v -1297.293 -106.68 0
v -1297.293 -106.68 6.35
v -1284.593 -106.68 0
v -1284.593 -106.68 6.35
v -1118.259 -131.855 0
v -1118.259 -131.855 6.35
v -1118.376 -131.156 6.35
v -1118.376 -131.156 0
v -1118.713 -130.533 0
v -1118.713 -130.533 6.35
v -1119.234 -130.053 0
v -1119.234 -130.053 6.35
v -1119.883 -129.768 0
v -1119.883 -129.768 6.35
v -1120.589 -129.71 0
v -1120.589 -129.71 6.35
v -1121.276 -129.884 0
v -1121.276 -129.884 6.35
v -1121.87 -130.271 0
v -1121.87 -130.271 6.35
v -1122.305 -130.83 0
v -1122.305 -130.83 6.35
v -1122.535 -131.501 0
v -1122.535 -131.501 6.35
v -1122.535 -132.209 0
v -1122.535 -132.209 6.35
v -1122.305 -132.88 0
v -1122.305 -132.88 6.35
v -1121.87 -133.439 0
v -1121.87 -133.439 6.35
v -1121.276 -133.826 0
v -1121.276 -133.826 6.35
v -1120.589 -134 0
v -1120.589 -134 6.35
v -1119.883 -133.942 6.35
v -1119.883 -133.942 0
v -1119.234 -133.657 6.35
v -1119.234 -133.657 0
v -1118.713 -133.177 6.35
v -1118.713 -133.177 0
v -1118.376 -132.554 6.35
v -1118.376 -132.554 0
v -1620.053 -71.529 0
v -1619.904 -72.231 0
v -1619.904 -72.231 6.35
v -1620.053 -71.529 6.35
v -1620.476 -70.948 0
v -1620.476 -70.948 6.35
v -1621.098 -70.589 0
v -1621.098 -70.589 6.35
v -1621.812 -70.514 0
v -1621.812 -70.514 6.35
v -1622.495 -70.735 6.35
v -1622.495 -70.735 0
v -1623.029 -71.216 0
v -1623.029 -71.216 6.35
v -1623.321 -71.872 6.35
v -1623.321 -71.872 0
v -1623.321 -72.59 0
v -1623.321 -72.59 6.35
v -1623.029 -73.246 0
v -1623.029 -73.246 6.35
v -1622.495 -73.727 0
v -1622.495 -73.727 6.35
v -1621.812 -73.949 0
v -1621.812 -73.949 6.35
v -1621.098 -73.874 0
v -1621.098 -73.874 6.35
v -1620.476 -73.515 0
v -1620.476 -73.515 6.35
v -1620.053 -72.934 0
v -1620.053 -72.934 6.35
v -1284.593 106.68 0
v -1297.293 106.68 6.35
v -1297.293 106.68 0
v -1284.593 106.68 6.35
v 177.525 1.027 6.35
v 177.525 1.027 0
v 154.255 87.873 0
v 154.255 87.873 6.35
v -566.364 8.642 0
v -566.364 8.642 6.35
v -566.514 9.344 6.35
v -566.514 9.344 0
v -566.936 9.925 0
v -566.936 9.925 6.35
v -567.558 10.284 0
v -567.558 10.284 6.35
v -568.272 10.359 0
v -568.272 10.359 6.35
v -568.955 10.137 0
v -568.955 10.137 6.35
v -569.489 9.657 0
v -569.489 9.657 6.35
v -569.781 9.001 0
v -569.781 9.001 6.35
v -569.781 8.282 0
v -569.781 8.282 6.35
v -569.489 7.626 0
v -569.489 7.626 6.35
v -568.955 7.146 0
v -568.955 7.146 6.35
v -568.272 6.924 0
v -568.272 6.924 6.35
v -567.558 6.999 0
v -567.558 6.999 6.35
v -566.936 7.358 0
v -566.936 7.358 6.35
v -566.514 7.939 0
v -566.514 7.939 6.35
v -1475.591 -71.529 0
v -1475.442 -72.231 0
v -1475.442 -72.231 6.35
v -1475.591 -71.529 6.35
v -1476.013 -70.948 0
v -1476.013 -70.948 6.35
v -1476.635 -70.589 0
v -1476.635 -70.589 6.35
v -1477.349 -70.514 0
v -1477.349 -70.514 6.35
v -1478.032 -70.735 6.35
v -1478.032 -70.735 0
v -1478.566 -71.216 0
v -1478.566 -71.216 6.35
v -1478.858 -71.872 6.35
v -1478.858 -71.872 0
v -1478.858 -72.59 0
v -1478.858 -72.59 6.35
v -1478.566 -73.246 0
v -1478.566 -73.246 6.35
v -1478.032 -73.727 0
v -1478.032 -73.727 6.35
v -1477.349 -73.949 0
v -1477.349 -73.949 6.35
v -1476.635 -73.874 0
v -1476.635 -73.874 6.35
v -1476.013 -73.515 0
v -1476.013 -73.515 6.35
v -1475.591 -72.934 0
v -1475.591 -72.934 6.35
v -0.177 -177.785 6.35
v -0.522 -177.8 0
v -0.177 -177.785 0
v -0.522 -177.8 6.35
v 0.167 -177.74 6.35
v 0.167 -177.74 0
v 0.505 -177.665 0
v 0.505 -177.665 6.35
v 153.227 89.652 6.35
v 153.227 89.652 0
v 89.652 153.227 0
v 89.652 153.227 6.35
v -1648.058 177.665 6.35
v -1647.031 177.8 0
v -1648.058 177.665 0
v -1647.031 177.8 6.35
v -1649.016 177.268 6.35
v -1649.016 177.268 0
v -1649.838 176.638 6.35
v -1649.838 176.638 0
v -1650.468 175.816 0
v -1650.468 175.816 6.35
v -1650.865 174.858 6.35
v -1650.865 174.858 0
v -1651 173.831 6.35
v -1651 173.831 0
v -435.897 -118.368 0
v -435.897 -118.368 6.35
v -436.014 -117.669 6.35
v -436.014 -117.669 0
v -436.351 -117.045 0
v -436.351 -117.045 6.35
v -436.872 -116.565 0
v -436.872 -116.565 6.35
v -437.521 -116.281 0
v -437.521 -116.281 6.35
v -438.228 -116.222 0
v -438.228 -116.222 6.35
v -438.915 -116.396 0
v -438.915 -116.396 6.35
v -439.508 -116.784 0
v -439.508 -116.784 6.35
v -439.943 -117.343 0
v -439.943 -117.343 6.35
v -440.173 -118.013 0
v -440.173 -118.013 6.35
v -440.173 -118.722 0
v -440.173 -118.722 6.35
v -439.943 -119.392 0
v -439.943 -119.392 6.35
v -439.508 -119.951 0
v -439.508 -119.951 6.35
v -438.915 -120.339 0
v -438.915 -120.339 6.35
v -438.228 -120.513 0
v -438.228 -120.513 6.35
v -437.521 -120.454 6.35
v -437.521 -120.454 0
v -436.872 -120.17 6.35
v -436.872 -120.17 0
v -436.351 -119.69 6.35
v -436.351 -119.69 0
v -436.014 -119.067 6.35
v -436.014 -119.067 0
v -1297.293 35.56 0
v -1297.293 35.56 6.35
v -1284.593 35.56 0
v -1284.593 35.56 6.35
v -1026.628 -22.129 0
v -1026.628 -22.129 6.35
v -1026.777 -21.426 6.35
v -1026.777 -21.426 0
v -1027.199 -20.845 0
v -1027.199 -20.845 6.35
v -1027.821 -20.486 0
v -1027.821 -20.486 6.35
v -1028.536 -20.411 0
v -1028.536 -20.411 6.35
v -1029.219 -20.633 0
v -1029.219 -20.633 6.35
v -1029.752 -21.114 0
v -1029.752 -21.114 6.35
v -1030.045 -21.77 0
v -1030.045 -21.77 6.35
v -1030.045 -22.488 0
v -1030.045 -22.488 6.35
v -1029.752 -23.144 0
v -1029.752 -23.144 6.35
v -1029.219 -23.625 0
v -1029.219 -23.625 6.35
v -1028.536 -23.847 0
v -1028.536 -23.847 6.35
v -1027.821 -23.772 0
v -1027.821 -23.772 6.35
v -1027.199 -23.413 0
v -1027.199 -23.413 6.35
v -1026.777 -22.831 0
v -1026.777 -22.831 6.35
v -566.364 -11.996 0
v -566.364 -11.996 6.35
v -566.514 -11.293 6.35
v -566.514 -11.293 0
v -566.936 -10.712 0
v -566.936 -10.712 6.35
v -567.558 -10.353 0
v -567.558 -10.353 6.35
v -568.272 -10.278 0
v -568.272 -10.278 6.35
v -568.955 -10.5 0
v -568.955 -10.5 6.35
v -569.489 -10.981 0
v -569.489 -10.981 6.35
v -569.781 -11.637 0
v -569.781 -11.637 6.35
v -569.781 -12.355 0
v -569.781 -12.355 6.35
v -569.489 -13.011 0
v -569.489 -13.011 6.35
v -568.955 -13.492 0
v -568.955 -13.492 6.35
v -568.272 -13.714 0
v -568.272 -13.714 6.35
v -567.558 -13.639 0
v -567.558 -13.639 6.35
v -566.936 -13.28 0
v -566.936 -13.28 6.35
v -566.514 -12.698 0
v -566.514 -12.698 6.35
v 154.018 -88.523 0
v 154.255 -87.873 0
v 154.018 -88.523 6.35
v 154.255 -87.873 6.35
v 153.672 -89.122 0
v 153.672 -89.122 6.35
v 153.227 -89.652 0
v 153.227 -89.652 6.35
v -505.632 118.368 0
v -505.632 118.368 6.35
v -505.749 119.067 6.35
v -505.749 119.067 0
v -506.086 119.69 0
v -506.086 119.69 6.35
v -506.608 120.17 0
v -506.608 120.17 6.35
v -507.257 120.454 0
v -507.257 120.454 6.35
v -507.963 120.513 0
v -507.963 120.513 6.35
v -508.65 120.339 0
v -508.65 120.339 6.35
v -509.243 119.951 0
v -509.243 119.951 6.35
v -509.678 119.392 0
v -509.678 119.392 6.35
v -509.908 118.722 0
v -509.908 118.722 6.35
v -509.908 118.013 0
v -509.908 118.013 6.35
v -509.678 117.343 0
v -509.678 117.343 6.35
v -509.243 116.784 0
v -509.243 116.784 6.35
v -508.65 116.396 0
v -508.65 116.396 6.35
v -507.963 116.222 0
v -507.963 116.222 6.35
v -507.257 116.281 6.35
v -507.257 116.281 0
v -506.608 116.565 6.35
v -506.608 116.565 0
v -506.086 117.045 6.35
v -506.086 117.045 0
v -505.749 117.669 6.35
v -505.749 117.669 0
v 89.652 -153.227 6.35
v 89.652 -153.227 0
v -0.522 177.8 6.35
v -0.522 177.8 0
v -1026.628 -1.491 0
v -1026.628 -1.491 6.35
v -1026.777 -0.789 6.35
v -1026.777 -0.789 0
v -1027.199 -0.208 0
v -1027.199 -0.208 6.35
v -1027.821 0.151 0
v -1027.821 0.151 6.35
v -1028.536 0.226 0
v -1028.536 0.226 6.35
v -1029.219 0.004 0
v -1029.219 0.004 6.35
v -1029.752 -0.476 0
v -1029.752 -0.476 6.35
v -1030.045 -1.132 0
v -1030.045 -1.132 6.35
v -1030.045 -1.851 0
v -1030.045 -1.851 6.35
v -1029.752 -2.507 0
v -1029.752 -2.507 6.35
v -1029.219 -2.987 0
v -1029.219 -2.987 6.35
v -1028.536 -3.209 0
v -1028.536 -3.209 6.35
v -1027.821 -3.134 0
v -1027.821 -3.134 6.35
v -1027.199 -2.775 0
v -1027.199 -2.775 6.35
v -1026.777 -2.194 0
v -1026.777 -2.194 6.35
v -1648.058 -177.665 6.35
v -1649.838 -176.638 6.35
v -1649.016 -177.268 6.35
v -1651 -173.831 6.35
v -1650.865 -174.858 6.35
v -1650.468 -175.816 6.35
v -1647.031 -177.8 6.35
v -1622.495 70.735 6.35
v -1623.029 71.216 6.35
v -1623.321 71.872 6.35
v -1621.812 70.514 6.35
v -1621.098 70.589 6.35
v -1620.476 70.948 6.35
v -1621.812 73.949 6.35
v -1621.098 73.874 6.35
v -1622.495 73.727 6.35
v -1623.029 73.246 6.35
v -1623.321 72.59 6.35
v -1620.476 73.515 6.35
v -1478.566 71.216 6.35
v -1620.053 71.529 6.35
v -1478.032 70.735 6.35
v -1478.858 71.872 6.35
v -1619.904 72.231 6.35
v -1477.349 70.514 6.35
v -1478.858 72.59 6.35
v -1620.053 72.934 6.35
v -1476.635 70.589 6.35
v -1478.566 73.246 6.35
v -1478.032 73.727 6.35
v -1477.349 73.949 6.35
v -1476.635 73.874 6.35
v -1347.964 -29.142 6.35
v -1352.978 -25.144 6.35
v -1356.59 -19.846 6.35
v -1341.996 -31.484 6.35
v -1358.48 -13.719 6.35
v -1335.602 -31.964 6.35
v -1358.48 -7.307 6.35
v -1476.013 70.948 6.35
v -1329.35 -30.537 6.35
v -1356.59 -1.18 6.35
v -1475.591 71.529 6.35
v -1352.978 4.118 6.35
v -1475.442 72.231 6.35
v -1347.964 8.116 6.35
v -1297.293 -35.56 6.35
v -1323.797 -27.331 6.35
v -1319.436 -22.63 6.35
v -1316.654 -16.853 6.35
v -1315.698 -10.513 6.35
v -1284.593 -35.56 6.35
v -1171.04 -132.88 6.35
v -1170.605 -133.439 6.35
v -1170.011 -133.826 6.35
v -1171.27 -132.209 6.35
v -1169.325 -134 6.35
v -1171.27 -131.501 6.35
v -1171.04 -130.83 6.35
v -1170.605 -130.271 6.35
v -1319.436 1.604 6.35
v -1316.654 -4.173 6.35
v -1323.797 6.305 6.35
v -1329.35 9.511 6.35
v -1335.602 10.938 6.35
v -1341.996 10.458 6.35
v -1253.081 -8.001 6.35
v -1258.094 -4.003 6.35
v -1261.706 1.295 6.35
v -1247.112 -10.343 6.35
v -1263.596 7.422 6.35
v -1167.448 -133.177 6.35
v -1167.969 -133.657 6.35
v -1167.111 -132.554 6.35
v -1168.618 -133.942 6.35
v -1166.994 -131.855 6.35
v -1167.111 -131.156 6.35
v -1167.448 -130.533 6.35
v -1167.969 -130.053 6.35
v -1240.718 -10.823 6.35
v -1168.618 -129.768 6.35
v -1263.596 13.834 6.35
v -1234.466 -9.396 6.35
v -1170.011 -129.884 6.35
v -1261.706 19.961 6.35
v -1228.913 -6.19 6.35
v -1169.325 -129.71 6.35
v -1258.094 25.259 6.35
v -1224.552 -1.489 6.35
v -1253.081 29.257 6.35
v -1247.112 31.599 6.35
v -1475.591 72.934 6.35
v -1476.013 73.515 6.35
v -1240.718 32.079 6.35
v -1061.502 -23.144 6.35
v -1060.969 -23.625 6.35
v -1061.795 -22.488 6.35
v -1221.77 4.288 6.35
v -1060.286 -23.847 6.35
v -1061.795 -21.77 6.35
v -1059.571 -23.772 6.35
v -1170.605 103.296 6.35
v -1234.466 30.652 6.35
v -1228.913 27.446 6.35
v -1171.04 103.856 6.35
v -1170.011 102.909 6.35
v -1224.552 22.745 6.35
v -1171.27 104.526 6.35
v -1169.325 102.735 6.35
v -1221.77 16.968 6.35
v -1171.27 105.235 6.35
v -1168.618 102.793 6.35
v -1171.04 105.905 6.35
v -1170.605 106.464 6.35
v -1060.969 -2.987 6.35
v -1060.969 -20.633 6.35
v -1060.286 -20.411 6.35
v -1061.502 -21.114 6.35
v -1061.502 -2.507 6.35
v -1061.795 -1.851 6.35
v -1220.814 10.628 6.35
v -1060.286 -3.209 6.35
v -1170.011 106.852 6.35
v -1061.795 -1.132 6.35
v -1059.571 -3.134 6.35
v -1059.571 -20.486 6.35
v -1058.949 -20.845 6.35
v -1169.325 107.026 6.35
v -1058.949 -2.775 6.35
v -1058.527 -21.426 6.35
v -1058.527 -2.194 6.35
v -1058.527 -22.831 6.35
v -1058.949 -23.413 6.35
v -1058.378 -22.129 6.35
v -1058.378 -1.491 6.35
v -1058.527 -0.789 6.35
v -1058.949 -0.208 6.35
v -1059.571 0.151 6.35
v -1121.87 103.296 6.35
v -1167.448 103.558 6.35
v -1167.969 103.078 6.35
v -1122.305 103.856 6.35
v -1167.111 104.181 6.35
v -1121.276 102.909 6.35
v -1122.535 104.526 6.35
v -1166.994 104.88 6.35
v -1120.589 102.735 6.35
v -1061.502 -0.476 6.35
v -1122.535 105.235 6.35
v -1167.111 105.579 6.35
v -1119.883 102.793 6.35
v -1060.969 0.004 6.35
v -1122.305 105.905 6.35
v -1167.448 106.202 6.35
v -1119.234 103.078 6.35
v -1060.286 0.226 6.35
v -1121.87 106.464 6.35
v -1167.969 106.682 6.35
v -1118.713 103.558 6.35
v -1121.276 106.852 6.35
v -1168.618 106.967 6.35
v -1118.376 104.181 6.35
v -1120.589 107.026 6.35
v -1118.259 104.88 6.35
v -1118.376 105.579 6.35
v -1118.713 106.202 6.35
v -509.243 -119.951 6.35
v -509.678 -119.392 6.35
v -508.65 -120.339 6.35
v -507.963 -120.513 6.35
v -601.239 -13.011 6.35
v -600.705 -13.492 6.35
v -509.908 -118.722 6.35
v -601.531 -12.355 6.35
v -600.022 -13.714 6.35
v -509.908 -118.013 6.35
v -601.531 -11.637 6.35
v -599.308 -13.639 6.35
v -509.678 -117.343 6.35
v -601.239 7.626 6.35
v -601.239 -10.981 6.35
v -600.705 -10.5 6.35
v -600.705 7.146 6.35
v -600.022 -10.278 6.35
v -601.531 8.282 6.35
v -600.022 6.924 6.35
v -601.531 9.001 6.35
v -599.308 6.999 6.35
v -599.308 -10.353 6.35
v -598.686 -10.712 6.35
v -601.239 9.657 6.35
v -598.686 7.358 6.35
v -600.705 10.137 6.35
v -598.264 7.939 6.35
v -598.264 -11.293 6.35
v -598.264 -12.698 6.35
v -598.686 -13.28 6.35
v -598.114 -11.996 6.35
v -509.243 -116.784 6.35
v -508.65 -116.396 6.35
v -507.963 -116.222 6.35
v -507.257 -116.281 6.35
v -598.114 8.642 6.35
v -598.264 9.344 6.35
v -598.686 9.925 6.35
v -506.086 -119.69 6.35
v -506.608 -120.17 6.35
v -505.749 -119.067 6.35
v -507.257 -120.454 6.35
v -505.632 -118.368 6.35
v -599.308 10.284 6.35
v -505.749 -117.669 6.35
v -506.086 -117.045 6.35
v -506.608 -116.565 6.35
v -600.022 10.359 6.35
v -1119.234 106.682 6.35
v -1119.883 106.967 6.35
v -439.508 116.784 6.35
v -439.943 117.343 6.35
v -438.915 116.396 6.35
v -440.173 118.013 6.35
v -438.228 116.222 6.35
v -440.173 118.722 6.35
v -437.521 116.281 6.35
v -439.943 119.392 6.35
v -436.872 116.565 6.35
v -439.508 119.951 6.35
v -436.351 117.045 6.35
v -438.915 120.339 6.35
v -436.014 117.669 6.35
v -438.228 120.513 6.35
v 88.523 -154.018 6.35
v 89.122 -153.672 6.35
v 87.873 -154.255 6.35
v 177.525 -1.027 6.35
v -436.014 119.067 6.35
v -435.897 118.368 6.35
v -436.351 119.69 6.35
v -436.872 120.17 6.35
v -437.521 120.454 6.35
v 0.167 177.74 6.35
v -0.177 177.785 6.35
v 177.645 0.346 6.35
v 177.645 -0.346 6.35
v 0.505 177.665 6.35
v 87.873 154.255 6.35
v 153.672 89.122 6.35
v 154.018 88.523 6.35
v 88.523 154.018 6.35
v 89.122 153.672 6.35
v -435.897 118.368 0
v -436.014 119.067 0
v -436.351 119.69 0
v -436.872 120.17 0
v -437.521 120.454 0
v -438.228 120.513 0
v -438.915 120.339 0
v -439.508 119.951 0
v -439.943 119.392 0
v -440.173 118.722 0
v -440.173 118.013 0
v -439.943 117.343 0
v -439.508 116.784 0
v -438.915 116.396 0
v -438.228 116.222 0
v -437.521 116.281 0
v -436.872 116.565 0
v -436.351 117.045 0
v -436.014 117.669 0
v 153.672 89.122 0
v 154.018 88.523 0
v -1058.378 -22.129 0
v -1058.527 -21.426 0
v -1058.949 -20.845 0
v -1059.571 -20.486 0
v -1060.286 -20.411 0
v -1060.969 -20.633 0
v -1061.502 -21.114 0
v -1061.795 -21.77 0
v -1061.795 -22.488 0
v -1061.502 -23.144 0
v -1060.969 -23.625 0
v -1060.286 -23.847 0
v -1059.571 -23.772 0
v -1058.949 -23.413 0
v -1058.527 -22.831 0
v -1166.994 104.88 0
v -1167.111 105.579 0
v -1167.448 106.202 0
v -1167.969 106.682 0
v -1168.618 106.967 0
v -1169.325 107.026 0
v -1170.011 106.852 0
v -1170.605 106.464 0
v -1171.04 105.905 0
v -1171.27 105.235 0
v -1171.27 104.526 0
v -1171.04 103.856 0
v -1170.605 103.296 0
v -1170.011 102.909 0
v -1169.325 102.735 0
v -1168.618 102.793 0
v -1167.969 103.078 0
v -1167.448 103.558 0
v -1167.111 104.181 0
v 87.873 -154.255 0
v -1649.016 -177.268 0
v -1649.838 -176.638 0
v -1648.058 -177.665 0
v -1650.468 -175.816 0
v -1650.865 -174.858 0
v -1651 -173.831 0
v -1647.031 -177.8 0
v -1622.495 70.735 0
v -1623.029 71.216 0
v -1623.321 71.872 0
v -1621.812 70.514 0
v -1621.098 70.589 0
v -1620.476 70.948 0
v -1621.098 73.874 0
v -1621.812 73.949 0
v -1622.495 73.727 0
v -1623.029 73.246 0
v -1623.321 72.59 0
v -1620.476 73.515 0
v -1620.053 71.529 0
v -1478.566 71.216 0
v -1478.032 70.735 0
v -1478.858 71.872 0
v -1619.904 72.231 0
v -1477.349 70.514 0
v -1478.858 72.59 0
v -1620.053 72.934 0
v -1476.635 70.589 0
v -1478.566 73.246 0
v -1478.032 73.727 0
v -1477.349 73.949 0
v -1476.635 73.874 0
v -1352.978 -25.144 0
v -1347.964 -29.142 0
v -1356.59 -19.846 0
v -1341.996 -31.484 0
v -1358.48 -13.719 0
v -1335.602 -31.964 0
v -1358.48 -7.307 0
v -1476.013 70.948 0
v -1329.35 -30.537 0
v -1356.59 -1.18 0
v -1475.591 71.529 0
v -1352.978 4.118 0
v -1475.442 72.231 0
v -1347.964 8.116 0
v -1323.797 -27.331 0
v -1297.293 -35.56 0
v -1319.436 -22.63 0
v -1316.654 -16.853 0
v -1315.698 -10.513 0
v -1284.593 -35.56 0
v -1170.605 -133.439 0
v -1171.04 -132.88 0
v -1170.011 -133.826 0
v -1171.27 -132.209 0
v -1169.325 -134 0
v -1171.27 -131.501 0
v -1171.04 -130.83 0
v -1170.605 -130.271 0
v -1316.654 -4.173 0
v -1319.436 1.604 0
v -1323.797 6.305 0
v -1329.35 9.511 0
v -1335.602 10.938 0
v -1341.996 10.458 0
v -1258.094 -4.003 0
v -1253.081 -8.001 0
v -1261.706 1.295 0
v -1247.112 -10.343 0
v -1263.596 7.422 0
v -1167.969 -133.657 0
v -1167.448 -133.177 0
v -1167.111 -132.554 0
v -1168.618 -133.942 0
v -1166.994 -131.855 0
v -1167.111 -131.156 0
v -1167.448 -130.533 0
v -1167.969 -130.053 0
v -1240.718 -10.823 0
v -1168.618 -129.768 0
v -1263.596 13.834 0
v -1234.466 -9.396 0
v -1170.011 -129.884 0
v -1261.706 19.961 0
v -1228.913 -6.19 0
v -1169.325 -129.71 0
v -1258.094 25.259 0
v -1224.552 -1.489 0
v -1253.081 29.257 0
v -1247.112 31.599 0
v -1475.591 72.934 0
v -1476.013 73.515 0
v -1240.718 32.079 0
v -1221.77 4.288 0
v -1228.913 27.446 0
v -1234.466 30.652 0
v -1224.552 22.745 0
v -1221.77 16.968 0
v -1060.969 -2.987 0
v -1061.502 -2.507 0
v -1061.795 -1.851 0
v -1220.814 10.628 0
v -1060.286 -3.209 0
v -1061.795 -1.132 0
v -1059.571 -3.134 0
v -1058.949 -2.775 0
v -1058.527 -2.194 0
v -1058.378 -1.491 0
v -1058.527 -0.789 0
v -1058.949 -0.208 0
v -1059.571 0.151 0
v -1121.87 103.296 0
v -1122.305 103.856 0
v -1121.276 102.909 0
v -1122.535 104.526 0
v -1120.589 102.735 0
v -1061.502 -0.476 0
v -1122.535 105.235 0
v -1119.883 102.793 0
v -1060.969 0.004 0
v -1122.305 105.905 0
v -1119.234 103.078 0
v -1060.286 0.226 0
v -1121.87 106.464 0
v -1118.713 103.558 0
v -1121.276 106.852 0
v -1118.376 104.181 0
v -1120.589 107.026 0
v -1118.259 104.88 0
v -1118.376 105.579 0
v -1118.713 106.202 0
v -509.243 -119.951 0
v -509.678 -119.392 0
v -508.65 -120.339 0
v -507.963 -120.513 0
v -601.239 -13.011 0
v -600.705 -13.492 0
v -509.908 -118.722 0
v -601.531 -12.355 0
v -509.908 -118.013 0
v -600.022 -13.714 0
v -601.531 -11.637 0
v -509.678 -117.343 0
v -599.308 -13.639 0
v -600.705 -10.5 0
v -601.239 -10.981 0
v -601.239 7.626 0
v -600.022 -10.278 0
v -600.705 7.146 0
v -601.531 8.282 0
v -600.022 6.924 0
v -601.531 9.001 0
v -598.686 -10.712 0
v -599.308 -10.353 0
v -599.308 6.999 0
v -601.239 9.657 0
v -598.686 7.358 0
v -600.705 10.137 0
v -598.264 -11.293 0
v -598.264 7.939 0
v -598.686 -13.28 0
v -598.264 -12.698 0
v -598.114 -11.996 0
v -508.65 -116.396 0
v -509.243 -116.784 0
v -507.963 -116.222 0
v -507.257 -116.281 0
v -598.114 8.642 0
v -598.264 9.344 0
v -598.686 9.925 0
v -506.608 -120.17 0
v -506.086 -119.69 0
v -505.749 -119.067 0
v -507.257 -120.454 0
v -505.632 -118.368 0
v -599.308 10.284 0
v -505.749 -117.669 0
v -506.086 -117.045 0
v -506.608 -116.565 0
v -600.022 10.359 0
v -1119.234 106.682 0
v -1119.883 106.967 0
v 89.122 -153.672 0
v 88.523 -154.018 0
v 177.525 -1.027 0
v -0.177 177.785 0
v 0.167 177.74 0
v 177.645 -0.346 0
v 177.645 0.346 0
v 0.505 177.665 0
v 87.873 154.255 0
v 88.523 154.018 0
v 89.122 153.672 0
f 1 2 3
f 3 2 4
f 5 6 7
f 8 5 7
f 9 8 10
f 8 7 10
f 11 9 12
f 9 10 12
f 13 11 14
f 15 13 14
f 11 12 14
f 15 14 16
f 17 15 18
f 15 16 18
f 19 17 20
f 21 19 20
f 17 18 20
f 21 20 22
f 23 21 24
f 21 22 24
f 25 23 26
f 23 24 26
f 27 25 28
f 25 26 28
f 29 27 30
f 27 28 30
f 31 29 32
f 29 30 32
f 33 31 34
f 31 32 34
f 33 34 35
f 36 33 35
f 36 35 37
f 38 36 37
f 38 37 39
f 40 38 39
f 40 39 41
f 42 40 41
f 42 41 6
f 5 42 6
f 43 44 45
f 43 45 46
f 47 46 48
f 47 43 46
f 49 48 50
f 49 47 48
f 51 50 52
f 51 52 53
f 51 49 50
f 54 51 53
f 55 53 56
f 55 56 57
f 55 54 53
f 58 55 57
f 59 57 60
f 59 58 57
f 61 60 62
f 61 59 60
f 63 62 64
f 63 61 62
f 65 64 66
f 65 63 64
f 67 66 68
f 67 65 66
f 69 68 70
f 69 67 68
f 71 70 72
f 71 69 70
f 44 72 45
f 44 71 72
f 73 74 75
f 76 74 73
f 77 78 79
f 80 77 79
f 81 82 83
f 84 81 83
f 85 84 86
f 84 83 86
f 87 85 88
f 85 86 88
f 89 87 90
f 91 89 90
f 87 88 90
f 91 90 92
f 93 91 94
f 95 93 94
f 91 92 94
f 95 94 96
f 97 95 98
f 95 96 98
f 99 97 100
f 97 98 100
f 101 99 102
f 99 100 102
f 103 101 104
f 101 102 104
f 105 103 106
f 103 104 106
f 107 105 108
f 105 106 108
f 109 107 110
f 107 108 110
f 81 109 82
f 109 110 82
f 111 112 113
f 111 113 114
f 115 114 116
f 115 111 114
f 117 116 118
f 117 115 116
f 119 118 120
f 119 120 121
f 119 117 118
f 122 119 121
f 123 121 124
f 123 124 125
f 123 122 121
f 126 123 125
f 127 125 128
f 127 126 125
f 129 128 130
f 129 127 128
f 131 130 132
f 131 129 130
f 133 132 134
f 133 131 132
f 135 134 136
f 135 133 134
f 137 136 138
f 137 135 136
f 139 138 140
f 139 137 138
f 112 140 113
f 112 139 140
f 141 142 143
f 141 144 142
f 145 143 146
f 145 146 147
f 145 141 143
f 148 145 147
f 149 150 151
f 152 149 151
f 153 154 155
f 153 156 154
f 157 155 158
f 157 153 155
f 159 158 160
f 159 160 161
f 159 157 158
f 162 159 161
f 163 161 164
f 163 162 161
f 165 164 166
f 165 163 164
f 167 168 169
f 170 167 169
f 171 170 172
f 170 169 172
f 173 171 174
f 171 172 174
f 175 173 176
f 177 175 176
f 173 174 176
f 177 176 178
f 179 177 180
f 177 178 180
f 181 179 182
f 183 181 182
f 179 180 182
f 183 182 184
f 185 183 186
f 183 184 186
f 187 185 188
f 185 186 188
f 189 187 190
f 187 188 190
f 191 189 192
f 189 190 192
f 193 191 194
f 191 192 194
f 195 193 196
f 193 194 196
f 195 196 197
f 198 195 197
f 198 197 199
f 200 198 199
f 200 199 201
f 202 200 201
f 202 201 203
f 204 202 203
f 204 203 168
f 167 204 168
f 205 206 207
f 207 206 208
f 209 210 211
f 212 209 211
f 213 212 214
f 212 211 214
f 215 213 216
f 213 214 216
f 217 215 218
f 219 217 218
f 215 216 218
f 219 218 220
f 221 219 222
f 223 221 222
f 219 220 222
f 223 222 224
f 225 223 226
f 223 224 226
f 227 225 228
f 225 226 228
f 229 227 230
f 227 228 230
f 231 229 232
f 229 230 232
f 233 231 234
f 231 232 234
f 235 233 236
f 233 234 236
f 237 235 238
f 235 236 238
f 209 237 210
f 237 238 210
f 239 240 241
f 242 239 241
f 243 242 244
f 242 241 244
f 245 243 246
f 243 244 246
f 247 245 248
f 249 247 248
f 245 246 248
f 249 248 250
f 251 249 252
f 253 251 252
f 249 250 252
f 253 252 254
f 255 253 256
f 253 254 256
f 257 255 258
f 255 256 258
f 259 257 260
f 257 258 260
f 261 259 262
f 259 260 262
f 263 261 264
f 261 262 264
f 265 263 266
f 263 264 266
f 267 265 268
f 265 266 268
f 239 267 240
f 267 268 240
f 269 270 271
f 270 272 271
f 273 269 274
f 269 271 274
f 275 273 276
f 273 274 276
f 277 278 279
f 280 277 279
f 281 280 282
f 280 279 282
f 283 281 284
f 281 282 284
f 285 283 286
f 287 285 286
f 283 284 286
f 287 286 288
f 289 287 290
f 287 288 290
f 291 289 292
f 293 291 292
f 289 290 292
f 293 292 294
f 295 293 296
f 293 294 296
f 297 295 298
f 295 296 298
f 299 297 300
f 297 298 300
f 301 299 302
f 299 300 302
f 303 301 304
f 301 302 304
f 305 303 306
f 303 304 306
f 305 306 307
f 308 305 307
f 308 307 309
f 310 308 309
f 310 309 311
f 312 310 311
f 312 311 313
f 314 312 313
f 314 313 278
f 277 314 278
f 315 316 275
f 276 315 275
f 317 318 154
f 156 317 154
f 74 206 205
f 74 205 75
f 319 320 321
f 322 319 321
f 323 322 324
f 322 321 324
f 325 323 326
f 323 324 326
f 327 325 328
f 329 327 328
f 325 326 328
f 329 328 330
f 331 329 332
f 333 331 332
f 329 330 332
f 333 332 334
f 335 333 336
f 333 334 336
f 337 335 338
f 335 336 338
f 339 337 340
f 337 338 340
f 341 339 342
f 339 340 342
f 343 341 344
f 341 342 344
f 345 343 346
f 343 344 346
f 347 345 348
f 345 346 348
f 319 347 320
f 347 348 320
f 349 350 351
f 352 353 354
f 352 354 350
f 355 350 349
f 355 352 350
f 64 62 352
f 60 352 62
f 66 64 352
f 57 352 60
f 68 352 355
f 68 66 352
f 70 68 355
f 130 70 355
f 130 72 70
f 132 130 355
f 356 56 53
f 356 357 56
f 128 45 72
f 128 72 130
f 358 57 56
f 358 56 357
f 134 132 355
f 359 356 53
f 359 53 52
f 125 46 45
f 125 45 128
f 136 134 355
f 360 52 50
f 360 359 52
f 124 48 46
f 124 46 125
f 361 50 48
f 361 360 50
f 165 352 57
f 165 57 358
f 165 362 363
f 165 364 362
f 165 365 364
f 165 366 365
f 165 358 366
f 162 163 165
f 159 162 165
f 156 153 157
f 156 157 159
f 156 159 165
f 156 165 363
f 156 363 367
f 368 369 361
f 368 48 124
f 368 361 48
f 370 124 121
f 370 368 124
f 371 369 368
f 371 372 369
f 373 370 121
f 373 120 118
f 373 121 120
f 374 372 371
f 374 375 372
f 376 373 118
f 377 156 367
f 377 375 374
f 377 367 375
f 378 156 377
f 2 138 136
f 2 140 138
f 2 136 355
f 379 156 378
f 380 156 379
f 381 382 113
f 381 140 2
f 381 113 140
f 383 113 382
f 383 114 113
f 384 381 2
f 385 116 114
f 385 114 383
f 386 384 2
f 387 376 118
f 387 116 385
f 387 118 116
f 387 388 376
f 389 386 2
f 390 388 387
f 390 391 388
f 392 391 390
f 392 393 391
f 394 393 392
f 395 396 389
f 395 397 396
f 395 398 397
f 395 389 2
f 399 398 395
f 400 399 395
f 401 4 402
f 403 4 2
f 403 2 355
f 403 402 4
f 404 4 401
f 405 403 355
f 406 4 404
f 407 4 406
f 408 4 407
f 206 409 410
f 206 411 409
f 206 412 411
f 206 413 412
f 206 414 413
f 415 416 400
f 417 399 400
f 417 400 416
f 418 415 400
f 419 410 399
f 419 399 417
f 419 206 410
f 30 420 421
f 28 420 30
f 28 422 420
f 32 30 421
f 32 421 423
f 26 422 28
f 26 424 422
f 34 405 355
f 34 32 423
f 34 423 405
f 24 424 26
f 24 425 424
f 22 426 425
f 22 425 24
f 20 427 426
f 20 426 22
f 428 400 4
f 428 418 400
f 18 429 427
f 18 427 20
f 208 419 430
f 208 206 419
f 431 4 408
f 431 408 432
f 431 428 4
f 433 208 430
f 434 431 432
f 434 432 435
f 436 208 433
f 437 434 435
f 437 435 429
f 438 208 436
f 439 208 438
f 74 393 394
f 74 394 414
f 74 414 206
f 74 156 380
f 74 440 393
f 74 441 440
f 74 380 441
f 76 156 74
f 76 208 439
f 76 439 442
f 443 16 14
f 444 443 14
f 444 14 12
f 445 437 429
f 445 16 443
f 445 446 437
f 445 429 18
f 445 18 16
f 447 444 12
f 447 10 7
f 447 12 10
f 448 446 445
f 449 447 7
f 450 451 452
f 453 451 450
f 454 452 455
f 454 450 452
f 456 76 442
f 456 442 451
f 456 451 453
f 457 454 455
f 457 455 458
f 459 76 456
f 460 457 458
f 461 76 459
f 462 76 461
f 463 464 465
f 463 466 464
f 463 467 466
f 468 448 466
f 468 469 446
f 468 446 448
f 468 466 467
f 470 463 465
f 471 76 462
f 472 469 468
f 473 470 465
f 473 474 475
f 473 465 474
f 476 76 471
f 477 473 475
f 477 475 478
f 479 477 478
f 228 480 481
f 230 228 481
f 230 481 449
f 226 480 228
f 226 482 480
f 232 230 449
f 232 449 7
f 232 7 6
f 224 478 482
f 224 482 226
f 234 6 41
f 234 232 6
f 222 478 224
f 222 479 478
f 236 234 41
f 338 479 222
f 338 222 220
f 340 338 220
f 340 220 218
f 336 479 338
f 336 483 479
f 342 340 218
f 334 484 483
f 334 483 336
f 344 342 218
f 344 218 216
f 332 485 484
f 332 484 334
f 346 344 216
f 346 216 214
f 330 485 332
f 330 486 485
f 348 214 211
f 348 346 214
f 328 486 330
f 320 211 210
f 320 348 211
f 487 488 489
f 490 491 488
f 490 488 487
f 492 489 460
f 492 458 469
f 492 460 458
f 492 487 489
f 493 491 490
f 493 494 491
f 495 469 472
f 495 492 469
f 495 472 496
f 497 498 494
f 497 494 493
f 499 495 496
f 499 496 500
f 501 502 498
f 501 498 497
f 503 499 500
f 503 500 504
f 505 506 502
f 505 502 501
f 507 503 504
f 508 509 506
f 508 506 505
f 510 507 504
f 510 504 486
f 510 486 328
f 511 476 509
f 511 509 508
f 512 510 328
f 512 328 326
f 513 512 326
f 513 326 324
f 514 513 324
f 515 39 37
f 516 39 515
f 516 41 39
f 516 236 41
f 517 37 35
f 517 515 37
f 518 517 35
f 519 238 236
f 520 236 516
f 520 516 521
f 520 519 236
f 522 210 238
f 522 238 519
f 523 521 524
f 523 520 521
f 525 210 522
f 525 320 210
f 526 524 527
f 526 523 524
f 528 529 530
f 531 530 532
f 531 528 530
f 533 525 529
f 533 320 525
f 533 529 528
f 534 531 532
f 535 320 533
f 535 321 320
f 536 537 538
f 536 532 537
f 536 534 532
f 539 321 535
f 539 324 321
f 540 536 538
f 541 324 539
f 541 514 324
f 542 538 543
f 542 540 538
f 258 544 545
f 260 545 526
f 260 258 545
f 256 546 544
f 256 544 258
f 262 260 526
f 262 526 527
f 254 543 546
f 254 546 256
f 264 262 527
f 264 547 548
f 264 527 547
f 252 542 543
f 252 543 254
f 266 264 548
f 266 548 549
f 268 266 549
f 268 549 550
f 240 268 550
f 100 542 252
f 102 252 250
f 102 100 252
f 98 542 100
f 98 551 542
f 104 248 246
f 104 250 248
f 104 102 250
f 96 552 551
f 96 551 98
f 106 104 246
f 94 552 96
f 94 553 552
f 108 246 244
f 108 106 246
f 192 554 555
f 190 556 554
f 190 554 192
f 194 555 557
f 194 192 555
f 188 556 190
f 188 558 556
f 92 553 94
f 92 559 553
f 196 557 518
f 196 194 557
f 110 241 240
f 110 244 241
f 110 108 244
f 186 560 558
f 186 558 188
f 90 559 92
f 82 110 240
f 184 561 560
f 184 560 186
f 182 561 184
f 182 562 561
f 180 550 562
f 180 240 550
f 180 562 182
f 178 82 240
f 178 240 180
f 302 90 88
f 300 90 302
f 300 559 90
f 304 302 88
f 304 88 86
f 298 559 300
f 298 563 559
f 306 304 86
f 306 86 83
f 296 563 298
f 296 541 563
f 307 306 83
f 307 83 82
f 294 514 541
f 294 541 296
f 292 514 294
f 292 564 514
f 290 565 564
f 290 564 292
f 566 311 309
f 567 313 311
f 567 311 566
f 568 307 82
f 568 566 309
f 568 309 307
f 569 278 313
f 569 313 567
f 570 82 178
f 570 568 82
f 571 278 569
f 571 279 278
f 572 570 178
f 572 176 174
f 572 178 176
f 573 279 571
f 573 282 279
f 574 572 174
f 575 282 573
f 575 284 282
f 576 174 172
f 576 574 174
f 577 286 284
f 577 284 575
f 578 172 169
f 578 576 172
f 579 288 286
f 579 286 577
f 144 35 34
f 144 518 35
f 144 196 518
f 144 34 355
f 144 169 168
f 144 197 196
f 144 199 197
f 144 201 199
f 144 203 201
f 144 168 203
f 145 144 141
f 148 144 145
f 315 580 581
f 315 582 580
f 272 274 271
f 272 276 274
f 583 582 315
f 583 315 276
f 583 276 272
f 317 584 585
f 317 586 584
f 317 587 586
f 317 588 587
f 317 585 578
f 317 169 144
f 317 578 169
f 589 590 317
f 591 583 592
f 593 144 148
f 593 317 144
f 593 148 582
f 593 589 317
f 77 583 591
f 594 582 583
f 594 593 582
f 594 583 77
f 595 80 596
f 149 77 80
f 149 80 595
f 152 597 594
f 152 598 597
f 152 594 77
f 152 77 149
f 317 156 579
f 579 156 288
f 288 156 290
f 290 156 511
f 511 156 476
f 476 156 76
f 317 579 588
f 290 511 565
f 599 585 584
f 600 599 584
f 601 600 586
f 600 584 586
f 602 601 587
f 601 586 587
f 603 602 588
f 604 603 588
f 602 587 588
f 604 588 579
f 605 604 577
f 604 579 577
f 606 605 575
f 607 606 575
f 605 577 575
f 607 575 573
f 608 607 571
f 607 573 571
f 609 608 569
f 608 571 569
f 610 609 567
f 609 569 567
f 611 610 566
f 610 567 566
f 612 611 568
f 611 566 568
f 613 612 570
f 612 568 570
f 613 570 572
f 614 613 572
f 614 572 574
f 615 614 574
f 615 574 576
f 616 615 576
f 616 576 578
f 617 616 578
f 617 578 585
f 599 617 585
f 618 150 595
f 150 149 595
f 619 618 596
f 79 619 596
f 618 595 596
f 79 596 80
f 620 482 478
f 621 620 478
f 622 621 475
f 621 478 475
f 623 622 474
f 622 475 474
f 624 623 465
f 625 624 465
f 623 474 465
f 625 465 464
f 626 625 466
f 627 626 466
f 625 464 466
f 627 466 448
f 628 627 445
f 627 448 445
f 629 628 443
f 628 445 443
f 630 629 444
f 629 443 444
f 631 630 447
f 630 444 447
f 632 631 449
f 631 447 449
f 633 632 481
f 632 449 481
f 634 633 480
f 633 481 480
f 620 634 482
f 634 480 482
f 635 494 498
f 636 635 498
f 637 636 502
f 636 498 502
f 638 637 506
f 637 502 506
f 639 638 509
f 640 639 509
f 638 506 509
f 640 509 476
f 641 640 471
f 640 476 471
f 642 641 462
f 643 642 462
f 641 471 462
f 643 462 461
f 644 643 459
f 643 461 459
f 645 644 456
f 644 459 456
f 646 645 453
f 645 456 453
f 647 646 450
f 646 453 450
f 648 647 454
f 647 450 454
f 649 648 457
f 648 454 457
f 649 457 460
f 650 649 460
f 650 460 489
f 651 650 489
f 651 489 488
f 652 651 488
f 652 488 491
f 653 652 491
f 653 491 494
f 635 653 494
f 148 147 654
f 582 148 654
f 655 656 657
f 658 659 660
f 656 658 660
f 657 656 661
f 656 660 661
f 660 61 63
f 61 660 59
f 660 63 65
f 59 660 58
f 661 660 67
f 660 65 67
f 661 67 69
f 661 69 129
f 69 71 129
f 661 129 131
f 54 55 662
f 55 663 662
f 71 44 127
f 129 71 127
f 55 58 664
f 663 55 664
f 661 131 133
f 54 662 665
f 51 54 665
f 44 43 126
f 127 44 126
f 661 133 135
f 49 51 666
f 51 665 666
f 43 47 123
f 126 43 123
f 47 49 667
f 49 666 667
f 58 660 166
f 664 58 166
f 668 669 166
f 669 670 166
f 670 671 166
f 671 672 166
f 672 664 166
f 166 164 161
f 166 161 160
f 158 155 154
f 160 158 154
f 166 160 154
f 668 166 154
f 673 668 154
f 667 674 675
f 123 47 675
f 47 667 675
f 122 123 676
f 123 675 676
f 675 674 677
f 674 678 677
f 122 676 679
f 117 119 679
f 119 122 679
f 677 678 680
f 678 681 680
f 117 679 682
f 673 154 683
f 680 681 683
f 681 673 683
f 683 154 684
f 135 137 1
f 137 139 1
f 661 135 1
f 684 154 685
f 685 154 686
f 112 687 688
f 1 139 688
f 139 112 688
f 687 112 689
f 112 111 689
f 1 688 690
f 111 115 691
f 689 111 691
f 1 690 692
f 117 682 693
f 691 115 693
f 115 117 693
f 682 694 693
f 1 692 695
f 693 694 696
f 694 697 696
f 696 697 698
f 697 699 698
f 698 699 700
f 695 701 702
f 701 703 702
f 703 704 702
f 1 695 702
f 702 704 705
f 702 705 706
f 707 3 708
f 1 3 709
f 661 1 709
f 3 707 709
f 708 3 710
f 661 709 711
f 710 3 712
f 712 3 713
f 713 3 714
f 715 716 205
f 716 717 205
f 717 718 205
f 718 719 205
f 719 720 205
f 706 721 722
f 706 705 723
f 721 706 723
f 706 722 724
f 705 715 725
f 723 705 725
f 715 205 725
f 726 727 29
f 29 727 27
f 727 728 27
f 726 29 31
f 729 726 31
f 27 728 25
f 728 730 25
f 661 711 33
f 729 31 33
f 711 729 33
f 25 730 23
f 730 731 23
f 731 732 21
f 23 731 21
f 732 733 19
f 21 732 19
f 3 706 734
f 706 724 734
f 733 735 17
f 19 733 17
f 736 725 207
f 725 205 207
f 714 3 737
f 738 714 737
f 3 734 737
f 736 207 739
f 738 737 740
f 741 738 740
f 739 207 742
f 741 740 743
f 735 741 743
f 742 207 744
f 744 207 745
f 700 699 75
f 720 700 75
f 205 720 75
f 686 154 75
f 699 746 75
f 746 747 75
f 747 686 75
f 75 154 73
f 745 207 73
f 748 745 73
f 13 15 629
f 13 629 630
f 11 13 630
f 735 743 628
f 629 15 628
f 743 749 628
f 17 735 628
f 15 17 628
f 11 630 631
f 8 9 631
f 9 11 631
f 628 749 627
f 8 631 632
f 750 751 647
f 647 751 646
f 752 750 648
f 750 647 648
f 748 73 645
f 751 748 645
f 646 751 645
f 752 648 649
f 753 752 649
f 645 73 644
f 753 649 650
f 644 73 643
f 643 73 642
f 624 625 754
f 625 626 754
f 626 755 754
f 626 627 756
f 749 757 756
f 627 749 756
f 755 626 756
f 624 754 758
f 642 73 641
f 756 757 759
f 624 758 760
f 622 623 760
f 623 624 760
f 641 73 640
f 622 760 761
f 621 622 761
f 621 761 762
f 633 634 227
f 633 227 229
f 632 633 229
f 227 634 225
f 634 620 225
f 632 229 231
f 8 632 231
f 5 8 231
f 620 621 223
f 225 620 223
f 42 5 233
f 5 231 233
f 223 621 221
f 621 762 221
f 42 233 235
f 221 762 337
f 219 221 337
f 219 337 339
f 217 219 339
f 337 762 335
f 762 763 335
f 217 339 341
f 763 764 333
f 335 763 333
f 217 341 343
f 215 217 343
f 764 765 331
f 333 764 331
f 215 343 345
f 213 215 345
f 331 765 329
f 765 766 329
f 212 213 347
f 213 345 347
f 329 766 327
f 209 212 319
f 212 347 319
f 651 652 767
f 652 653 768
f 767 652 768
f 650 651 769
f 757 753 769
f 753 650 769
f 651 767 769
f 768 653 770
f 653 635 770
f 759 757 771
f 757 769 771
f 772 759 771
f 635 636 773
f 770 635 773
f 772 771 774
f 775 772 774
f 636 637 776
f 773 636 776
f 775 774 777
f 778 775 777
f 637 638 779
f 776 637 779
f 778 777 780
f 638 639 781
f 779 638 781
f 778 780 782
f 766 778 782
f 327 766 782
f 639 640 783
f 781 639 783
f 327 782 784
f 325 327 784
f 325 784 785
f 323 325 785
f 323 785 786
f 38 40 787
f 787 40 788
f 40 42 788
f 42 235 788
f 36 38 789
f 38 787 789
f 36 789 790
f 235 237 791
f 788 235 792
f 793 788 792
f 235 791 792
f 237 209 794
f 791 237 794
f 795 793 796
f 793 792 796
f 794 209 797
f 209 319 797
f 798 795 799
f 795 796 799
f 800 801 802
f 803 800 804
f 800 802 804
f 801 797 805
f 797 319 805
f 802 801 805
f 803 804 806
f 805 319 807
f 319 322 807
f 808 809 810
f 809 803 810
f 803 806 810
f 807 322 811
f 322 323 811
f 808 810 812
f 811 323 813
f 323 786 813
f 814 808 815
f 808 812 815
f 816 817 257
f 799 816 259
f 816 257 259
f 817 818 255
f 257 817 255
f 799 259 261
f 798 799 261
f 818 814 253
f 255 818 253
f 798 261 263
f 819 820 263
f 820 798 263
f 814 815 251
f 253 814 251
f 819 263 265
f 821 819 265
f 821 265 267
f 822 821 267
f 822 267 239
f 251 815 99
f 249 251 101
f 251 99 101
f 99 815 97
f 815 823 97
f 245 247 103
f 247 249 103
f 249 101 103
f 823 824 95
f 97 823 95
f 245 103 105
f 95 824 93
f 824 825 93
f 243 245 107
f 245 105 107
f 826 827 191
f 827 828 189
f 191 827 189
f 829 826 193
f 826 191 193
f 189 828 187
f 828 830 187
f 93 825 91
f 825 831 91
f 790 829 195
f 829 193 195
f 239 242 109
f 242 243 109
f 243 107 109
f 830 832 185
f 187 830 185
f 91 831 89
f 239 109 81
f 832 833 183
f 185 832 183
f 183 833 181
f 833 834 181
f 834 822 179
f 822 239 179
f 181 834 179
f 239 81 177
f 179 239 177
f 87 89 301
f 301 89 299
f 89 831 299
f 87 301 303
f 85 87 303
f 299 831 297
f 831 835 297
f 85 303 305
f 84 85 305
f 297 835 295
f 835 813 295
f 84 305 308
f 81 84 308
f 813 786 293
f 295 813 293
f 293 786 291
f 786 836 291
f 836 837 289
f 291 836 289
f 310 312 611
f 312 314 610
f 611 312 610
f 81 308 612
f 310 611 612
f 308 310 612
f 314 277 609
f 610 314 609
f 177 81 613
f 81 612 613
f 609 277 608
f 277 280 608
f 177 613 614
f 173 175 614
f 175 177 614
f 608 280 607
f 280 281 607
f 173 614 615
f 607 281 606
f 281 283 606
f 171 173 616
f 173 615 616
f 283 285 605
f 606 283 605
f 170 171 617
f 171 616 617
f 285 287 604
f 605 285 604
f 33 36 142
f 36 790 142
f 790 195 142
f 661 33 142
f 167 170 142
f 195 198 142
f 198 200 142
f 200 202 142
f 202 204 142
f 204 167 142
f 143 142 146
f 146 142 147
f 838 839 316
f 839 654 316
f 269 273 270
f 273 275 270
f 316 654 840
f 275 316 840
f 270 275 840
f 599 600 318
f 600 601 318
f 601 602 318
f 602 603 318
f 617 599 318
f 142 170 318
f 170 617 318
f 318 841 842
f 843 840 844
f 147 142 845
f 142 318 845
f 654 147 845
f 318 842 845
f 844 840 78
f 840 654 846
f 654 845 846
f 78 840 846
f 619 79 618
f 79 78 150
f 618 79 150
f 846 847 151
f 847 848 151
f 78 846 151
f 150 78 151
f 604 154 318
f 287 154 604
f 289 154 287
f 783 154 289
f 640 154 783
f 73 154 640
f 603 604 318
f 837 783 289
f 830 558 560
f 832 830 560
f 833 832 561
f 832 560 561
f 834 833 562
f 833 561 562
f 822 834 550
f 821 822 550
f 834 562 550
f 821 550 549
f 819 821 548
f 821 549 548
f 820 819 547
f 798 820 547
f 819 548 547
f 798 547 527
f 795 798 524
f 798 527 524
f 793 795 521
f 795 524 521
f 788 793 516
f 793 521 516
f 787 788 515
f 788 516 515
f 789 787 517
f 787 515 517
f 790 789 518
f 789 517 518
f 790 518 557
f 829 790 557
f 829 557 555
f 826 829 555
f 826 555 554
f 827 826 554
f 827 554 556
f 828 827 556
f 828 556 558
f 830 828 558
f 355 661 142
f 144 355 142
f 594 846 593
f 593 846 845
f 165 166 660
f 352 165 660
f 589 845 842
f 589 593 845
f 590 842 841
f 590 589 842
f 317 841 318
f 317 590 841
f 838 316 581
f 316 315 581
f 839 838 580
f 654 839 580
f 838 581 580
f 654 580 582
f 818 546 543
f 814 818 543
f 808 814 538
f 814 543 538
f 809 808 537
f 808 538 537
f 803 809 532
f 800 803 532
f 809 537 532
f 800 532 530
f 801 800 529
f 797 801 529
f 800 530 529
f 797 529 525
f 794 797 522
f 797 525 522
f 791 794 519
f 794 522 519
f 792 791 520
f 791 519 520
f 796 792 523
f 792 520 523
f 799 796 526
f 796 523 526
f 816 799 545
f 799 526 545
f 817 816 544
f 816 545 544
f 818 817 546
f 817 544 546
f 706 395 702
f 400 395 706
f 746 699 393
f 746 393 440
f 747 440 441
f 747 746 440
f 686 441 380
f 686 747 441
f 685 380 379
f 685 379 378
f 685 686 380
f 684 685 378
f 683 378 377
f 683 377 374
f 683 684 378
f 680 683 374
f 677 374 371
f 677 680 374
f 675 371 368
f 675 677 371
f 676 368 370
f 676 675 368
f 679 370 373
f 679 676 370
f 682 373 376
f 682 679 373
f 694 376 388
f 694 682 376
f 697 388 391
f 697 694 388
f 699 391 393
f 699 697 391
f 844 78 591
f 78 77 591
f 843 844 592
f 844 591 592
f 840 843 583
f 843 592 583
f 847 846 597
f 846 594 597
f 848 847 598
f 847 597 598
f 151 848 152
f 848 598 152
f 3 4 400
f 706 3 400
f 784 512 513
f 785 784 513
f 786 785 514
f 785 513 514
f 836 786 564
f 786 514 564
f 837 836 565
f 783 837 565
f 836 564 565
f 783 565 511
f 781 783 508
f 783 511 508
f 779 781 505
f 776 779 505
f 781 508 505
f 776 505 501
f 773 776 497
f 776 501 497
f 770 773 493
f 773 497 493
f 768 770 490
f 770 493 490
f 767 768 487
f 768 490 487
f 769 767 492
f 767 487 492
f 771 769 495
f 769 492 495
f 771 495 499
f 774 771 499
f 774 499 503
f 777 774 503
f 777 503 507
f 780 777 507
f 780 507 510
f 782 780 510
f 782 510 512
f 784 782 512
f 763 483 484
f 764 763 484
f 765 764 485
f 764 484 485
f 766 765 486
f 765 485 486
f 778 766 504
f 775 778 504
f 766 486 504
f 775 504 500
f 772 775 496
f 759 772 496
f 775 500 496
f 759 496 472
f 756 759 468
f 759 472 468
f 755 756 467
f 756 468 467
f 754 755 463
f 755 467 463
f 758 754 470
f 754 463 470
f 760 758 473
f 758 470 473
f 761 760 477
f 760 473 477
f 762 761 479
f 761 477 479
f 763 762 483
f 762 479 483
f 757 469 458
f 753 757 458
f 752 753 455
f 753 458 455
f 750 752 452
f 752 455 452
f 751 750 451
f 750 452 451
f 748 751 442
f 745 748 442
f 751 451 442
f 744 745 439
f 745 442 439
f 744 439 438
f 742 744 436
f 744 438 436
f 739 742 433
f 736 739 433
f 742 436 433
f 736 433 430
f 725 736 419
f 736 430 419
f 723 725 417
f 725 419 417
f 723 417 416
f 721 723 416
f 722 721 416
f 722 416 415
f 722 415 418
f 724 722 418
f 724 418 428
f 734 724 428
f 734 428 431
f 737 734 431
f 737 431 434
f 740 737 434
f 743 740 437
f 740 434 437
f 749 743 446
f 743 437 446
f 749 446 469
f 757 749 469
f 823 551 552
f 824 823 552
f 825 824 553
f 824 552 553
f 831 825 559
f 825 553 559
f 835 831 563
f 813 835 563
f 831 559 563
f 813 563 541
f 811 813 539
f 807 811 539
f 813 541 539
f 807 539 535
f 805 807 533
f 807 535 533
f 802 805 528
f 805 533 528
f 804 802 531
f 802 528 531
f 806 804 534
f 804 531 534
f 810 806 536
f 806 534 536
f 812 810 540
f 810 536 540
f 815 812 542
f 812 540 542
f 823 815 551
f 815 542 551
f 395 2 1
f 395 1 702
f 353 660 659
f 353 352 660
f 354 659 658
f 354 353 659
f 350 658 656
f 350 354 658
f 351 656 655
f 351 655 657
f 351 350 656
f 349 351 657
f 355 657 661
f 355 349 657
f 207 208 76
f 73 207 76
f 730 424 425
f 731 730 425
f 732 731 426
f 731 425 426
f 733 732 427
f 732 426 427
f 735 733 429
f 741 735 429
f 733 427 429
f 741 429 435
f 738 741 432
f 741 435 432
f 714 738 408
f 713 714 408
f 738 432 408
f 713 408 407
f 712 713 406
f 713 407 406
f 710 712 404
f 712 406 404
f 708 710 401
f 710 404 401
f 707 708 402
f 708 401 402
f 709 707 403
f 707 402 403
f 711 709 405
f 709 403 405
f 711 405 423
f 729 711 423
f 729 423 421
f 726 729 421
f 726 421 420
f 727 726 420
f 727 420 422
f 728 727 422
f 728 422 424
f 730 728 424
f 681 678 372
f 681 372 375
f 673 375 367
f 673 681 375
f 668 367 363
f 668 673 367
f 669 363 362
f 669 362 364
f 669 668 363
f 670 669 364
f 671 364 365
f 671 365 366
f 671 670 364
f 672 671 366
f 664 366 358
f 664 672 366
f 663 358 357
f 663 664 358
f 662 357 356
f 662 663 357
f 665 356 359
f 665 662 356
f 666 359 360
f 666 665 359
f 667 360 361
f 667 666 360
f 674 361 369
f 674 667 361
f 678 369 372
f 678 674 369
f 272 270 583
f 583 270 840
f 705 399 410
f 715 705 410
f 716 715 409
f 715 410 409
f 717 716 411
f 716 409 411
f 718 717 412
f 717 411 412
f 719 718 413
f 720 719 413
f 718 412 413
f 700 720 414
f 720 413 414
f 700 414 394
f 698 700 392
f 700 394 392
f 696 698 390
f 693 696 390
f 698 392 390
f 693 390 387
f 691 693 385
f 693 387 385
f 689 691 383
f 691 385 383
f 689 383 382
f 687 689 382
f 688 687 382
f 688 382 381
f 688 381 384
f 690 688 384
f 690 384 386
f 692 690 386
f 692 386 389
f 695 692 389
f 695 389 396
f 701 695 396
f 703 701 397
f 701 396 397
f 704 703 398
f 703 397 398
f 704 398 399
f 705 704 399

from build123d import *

# Parameters (mm, degrees)
F0_R     = 1.7272
F1_DEPTH = 6.35
F2_R     = 1.7272
F2_R_2   = 2.15265
F2_W     = 12.7
F2_H     = 71.12
F2_R_3   = 21.510772
F3_DEPTH = 6.35
F4_R     = 3.96875


with BuildPart() as f1:
    # F0 (on Top) → F1 (new body)
    with BuildSketch(Plane.XY):
        Polygon((88.9, 153.979317), (0, 177.8), (-1651, 177.8), (-1651, -177.8), (0, -177.8), (88.9, -153.979317), (153.979317, -88.9), (177.8, 0), (153.979317, 88.9), align=None)
        with Locations((-1621.63125, -72.23125)):
            Circle(F0_R, mode=Mode.SUBTRACT)
        with Locations((-1477.16875, -72.23125)):
            Circle(F0_R, mode=Mode.SUBTRACT)
        with Locations((-1621.63125, 72.23125)):
            Circle(F0_R, mode=Mode.SUBTRACT)
        with Locations((-1477.16875, 72.23125)):
            Circle(F0_R, mode=Mode.SUBTRACT)
    extrude(amount=F1_DEPTH)

    # F2 (on face) → F3 (cut, through all)
    with BuildSketch(Plane.XY.offset(6.35)):
        with Locations((-568.091641, -11.995942)):
            Circle(F2_R)
        with Locations((-599.841641, -11.995942)):
            Circle(F2_R)
        with Locations((-599.841641, 8.641558)):
            Circle(F2_R)
        with Locations((-568.091641, 8.641558)):
            Circle(F2_R)
        with Locations((-1028.355112, -1.491475)):
            Circle(F2_R)
        with Locations((-1028.355112, -22.128975)):
            Circle(F2_R)
        with Locations((-1060.105112, -22.128975)):
            Circle(F2_R)
        with Locations((-1060.105112, -1.491475)):
            Circle(F2_R)
        with Locations((-438.049884, 118.36762)):
            Circle(F2_R_2)
        with Locations((-507.785101, 118.367619)):
            Circle(F2_R_2)
        with Locations((-507.785101, -118.36762)):
            Circle(F2_R_2)
        with Locations((-438.049884, -118.36762)):
            Circle(F2_R_2)
        with Locations((-1169.146759, -131.855036)):
            Circle(F2_R_2)
        with Locations((-1120.411652, -131.855036)):
            Circle(F2_R_2)
        with Locations((-1169.146759, 104.880203)):
            Circle(F2_R_2)
        with Locations((-1120.411652, 104.880203)):
            Circle(F2_R_2)
        with Locations((-1290.943305, 71.12)):
            Rectangle(F2_W, F2_H)
        with Locations((-1290.943305, -71.12)):
            Rectangle(F2_W, F2_H)
        with Locations((-1337.209023, -10.512984)):
            Circle(F2_R_3)
        with Locations((-1242.325218, 10.627991)):
            Circle(F2_R_3)
    extrude(amount=-F3_DEPTH, mode=Mode.SUBTRACT)

    # F4
    f4_edges = [f1.edges().sort_by_distance(p)[0] for p in [
        (0, -177.8, 3.175),
        (88.9, -153.979317, 3.175),
        (153.979317, -88.9, 3.175),
        (177.8, 0, 3.175),
        (153.979317, 88.9, 3.175),
        (88.9, 153.979317, 3.175),
        (0, 177.8, 3.175),
        (-1651, 177.8, 3.175),
        (-1651, -177.8, 3.175),
    ]]
    fillet(f4_edges, radius=F4_R)


solid = f1.part
